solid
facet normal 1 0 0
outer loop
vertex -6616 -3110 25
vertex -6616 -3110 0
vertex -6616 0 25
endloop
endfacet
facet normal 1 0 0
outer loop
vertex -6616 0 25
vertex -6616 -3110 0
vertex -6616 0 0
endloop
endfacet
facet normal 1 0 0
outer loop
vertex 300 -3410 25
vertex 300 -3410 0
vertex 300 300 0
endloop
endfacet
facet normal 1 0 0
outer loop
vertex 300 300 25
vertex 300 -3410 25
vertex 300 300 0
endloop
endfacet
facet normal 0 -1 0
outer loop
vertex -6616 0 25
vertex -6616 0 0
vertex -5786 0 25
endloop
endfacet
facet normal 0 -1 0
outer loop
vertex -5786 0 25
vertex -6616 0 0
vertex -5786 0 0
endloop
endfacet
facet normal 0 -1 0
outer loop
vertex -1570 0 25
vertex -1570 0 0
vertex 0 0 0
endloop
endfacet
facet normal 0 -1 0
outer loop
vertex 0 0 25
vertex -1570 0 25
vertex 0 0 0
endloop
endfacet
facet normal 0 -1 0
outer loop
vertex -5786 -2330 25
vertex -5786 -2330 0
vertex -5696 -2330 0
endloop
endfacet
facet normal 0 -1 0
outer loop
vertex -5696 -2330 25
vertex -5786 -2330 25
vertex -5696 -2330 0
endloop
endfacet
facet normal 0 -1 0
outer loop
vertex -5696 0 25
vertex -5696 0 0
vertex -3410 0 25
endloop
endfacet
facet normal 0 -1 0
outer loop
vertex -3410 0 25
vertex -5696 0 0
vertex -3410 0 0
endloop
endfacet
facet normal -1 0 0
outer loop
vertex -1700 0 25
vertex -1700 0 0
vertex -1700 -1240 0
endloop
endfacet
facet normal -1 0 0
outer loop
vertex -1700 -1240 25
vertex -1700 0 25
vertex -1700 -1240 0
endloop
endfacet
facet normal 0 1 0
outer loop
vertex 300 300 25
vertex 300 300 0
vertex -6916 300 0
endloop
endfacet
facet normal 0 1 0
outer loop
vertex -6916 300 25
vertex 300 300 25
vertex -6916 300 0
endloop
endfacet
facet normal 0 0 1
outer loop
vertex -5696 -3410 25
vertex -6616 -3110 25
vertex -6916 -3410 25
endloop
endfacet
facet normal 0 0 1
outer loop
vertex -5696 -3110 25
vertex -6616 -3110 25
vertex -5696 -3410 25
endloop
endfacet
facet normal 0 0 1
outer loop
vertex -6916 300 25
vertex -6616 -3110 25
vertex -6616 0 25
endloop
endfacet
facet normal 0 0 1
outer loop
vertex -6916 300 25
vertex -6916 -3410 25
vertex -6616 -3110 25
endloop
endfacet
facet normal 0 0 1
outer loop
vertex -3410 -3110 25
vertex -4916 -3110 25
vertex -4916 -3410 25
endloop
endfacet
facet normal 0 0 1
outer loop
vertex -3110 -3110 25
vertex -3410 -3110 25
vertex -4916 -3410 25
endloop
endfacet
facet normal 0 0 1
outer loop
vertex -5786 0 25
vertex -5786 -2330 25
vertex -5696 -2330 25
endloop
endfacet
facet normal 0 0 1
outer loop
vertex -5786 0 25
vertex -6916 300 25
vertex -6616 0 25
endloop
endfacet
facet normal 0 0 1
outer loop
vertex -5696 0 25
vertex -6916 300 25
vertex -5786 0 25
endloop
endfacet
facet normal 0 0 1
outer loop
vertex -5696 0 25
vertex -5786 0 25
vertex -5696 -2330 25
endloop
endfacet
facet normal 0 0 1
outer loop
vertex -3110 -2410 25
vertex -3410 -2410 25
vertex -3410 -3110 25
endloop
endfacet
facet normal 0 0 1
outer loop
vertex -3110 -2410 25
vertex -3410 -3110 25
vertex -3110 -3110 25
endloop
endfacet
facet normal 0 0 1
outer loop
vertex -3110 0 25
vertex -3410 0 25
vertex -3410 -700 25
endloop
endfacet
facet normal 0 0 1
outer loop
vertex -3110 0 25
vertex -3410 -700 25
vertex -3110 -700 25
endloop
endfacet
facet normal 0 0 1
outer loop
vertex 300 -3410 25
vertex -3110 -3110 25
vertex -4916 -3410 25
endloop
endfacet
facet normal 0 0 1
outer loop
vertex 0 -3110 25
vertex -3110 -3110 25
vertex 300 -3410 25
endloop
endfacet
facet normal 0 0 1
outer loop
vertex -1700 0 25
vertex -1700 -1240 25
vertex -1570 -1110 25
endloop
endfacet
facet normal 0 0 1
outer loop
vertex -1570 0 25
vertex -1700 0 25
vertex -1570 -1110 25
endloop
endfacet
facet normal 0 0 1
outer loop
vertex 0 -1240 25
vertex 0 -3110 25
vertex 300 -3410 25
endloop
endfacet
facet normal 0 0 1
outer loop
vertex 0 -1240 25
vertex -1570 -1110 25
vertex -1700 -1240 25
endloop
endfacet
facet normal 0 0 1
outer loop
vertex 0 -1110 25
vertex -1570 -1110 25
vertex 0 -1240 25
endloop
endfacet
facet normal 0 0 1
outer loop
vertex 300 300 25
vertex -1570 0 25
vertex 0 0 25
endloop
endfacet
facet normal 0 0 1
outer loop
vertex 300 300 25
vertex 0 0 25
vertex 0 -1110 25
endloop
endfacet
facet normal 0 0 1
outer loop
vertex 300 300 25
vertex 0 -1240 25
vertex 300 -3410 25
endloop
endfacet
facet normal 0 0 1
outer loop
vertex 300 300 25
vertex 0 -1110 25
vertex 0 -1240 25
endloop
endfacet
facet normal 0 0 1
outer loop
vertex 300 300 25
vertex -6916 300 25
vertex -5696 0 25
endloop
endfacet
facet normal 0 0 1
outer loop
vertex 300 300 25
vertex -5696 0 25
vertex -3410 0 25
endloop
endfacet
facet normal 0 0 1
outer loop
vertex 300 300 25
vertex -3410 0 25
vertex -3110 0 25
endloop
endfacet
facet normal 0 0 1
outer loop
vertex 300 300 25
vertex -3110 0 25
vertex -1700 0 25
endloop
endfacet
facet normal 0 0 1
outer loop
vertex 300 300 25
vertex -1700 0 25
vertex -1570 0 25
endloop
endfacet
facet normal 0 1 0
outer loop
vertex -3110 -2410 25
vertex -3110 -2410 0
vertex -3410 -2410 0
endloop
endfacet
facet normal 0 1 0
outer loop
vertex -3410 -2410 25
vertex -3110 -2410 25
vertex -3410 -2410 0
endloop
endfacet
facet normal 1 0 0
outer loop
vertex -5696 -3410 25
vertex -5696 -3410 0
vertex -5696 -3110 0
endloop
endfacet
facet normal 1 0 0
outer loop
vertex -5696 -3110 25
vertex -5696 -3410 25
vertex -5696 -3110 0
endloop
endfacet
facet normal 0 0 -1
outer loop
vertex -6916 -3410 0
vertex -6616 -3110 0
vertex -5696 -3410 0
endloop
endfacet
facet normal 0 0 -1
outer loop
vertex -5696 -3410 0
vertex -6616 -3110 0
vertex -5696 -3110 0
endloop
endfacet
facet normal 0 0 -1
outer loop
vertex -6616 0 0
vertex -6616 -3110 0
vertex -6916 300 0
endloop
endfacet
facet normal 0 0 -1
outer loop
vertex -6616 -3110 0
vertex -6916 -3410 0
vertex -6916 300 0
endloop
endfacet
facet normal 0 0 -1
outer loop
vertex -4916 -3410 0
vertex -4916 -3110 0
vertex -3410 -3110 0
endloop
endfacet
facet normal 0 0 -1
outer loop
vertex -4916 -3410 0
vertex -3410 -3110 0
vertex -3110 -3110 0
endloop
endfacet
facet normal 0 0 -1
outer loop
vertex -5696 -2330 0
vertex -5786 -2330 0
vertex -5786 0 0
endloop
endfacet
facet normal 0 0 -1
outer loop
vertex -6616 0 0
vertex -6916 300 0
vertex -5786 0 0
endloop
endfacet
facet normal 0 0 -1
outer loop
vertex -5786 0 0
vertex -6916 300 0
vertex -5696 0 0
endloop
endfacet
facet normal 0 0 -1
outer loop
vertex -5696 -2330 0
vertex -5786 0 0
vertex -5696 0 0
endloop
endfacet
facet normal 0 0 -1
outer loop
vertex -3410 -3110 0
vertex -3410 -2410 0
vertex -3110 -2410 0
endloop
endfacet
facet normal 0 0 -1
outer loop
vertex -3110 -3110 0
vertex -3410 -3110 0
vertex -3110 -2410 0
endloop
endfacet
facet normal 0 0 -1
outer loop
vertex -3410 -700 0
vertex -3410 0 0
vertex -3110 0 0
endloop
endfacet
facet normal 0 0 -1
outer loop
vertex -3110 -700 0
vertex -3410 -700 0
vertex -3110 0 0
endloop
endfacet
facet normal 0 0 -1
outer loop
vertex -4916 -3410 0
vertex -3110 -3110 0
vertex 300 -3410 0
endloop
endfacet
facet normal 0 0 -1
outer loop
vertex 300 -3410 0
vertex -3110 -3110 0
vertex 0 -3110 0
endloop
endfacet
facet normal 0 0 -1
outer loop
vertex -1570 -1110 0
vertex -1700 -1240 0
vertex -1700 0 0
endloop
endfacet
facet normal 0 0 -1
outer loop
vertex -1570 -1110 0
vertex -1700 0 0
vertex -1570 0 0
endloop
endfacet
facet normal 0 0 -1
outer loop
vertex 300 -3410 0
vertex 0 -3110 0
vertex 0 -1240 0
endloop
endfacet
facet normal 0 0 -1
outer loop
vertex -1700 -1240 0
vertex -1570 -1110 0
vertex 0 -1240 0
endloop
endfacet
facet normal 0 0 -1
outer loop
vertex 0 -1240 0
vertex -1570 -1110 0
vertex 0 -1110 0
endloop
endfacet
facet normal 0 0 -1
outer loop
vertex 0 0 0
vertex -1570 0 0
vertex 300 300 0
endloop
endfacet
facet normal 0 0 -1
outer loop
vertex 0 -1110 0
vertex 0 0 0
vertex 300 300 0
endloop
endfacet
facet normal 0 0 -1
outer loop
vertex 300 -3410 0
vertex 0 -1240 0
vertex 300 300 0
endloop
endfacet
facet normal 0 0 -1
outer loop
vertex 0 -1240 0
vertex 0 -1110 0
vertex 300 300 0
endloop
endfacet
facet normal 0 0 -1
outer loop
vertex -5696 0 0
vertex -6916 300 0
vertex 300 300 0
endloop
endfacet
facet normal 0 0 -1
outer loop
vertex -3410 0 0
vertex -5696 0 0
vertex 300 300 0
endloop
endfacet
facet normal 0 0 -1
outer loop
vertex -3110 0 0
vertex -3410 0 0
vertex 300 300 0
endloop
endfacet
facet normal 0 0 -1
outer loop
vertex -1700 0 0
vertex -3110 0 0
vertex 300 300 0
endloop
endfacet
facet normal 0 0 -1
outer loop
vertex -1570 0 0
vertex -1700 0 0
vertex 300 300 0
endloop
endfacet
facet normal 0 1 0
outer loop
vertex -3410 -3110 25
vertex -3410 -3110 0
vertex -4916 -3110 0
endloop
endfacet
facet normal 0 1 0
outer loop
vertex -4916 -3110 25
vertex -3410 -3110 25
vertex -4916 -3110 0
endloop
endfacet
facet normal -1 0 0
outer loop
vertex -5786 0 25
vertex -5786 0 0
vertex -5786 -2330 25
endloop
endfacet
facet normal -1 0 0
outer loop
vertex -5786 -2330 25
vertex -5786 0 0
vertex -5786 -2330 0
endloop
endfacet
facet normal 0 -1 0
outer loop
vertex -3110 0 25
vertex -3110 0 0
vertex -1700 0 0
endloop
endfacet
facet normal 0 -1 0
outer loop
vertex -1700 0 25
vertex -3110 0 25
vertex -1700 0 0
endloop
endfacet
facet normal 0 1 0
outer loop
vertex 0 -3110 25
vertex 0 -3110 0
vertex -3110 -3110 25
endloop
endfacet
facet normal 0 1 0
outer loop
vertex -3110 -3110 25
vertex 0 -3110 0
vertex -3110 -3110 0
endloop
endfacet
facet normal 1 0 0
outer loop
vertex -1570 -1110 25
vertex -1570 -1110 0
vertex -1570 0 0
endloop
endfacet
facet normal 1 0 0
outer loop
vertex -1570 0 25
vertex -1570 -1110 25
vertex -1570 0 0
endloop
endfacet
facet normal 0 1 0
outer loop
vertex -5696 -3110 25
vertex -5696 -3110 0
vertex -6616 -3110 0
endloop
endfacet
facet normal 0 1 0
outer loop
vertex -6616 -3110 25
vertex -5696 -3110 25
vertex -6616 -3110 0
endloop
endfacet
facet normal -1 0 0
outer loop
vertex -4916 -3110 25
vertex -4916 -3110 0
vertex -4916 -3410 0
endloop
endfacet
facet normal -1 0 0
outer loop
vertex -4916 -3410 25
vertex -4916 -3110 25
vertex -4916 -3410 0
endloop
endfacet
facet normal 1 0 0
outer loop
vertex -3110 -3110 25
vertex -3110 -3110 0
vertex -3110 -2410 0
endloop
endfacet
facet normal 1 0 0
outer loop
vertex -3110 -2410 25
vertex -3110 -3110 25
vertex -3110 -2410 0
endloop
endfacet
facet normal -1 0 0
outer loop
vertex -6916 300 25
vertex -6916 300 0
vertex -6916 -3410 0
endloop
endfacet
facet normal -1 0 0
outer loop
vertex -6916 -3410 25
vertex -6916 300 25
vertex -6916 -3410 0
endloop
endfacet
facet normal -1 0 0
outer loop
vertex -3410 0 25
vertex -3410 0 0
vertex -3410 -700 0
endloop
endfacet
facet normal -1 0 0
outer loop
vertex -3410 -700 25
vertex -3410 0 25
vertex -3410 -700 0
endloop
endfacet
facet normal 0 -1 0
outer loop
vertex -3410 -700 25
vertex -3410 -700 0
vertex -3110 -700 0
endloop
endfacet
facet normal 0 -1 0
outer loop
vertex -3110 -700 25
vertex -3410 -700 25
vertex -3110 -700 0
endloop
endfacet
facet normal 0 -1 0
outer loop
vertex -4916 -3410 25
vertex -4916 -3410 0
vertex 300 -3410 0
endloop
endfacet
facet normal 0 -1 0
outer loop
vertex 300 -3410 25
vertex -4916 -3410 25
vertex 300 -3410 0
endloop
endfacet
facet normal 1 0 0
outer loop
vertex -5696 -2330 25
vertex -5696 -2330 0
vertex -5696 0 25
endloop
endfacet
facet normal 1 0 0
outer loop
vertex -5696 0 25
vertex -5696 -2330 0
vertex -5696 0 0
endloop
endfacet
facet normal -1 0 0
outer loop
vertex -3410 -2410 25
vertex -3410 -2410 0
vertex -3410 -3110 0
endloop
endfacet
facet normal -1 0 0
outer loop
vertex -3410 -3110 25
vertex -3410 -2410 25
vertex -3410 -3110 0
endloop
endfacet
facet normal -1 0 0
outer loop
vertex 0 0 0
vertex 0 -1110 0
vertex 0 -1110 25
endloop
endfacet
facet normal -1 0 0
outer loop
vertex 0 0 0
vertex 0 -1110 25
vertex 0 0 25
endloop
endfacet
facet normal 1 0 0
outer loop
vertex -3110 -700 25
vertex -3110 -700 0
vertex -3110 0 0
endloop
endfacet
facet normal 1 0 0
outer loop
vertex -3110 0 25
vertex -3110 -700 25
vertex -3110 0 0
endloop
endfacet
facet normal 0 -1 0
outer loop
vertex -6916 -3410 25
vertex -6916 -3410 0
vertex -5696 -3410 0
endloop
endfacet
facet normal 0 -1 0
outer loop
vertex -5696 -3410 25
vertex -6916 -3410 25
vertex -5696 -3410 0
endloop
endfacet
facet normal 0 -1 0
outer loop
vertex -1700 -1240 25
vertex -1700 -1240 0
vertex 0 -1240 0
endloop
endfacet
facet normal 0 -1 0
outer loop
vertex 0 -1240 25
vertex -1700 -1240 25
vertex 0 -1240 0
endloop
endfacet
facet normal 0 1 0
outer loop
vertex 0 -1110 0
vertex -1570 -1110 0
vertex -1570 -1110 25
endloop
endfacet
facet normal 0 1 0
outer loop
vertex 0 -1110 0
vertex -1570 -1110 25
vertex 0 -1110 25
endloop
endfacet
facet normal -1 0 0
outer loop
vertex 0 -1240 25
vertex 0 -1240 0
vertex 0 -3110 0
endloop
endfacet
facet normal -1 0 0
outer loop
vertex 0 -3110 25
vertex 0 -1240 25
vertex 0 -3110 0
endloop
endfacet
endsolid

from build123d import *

# Parameters (mm, degrees)
F0_W     = 1570
F0_H     = 1110
F1_DEPTH = 25


with BuildPart() as f1:
    # F0 (on Top) → F1 (new body)
    with BuildSketch(Plane.XY):
        Polygon((0, -1240), (0, -3110), (-3110, -3110), (-3110, -2410), (-3410, -2410), (-3410, -3110), (-4916, -3110), (-4916, -3410), (300, -3410), (300, 300), (-6916, 300), (-6916, -3410), (-5696, -3410), (-5696, -3110), (-6616, -3110), (-6616, 0), (-5786, 0), (-5786, -2330), (-5696, -2330), (-5696, 0), (-3410, 0), (-3410, -700), (-3110, -700), (-3110, 0), (-1700, 0), (-1700, -1240), align=None)
        with Locations((-785, -555)):
            Rectangle(F0_W, F0_H, mode=Mode.SUBTRACT)
    extrude(amount=F1_DEPTH)


solid = f1.part
